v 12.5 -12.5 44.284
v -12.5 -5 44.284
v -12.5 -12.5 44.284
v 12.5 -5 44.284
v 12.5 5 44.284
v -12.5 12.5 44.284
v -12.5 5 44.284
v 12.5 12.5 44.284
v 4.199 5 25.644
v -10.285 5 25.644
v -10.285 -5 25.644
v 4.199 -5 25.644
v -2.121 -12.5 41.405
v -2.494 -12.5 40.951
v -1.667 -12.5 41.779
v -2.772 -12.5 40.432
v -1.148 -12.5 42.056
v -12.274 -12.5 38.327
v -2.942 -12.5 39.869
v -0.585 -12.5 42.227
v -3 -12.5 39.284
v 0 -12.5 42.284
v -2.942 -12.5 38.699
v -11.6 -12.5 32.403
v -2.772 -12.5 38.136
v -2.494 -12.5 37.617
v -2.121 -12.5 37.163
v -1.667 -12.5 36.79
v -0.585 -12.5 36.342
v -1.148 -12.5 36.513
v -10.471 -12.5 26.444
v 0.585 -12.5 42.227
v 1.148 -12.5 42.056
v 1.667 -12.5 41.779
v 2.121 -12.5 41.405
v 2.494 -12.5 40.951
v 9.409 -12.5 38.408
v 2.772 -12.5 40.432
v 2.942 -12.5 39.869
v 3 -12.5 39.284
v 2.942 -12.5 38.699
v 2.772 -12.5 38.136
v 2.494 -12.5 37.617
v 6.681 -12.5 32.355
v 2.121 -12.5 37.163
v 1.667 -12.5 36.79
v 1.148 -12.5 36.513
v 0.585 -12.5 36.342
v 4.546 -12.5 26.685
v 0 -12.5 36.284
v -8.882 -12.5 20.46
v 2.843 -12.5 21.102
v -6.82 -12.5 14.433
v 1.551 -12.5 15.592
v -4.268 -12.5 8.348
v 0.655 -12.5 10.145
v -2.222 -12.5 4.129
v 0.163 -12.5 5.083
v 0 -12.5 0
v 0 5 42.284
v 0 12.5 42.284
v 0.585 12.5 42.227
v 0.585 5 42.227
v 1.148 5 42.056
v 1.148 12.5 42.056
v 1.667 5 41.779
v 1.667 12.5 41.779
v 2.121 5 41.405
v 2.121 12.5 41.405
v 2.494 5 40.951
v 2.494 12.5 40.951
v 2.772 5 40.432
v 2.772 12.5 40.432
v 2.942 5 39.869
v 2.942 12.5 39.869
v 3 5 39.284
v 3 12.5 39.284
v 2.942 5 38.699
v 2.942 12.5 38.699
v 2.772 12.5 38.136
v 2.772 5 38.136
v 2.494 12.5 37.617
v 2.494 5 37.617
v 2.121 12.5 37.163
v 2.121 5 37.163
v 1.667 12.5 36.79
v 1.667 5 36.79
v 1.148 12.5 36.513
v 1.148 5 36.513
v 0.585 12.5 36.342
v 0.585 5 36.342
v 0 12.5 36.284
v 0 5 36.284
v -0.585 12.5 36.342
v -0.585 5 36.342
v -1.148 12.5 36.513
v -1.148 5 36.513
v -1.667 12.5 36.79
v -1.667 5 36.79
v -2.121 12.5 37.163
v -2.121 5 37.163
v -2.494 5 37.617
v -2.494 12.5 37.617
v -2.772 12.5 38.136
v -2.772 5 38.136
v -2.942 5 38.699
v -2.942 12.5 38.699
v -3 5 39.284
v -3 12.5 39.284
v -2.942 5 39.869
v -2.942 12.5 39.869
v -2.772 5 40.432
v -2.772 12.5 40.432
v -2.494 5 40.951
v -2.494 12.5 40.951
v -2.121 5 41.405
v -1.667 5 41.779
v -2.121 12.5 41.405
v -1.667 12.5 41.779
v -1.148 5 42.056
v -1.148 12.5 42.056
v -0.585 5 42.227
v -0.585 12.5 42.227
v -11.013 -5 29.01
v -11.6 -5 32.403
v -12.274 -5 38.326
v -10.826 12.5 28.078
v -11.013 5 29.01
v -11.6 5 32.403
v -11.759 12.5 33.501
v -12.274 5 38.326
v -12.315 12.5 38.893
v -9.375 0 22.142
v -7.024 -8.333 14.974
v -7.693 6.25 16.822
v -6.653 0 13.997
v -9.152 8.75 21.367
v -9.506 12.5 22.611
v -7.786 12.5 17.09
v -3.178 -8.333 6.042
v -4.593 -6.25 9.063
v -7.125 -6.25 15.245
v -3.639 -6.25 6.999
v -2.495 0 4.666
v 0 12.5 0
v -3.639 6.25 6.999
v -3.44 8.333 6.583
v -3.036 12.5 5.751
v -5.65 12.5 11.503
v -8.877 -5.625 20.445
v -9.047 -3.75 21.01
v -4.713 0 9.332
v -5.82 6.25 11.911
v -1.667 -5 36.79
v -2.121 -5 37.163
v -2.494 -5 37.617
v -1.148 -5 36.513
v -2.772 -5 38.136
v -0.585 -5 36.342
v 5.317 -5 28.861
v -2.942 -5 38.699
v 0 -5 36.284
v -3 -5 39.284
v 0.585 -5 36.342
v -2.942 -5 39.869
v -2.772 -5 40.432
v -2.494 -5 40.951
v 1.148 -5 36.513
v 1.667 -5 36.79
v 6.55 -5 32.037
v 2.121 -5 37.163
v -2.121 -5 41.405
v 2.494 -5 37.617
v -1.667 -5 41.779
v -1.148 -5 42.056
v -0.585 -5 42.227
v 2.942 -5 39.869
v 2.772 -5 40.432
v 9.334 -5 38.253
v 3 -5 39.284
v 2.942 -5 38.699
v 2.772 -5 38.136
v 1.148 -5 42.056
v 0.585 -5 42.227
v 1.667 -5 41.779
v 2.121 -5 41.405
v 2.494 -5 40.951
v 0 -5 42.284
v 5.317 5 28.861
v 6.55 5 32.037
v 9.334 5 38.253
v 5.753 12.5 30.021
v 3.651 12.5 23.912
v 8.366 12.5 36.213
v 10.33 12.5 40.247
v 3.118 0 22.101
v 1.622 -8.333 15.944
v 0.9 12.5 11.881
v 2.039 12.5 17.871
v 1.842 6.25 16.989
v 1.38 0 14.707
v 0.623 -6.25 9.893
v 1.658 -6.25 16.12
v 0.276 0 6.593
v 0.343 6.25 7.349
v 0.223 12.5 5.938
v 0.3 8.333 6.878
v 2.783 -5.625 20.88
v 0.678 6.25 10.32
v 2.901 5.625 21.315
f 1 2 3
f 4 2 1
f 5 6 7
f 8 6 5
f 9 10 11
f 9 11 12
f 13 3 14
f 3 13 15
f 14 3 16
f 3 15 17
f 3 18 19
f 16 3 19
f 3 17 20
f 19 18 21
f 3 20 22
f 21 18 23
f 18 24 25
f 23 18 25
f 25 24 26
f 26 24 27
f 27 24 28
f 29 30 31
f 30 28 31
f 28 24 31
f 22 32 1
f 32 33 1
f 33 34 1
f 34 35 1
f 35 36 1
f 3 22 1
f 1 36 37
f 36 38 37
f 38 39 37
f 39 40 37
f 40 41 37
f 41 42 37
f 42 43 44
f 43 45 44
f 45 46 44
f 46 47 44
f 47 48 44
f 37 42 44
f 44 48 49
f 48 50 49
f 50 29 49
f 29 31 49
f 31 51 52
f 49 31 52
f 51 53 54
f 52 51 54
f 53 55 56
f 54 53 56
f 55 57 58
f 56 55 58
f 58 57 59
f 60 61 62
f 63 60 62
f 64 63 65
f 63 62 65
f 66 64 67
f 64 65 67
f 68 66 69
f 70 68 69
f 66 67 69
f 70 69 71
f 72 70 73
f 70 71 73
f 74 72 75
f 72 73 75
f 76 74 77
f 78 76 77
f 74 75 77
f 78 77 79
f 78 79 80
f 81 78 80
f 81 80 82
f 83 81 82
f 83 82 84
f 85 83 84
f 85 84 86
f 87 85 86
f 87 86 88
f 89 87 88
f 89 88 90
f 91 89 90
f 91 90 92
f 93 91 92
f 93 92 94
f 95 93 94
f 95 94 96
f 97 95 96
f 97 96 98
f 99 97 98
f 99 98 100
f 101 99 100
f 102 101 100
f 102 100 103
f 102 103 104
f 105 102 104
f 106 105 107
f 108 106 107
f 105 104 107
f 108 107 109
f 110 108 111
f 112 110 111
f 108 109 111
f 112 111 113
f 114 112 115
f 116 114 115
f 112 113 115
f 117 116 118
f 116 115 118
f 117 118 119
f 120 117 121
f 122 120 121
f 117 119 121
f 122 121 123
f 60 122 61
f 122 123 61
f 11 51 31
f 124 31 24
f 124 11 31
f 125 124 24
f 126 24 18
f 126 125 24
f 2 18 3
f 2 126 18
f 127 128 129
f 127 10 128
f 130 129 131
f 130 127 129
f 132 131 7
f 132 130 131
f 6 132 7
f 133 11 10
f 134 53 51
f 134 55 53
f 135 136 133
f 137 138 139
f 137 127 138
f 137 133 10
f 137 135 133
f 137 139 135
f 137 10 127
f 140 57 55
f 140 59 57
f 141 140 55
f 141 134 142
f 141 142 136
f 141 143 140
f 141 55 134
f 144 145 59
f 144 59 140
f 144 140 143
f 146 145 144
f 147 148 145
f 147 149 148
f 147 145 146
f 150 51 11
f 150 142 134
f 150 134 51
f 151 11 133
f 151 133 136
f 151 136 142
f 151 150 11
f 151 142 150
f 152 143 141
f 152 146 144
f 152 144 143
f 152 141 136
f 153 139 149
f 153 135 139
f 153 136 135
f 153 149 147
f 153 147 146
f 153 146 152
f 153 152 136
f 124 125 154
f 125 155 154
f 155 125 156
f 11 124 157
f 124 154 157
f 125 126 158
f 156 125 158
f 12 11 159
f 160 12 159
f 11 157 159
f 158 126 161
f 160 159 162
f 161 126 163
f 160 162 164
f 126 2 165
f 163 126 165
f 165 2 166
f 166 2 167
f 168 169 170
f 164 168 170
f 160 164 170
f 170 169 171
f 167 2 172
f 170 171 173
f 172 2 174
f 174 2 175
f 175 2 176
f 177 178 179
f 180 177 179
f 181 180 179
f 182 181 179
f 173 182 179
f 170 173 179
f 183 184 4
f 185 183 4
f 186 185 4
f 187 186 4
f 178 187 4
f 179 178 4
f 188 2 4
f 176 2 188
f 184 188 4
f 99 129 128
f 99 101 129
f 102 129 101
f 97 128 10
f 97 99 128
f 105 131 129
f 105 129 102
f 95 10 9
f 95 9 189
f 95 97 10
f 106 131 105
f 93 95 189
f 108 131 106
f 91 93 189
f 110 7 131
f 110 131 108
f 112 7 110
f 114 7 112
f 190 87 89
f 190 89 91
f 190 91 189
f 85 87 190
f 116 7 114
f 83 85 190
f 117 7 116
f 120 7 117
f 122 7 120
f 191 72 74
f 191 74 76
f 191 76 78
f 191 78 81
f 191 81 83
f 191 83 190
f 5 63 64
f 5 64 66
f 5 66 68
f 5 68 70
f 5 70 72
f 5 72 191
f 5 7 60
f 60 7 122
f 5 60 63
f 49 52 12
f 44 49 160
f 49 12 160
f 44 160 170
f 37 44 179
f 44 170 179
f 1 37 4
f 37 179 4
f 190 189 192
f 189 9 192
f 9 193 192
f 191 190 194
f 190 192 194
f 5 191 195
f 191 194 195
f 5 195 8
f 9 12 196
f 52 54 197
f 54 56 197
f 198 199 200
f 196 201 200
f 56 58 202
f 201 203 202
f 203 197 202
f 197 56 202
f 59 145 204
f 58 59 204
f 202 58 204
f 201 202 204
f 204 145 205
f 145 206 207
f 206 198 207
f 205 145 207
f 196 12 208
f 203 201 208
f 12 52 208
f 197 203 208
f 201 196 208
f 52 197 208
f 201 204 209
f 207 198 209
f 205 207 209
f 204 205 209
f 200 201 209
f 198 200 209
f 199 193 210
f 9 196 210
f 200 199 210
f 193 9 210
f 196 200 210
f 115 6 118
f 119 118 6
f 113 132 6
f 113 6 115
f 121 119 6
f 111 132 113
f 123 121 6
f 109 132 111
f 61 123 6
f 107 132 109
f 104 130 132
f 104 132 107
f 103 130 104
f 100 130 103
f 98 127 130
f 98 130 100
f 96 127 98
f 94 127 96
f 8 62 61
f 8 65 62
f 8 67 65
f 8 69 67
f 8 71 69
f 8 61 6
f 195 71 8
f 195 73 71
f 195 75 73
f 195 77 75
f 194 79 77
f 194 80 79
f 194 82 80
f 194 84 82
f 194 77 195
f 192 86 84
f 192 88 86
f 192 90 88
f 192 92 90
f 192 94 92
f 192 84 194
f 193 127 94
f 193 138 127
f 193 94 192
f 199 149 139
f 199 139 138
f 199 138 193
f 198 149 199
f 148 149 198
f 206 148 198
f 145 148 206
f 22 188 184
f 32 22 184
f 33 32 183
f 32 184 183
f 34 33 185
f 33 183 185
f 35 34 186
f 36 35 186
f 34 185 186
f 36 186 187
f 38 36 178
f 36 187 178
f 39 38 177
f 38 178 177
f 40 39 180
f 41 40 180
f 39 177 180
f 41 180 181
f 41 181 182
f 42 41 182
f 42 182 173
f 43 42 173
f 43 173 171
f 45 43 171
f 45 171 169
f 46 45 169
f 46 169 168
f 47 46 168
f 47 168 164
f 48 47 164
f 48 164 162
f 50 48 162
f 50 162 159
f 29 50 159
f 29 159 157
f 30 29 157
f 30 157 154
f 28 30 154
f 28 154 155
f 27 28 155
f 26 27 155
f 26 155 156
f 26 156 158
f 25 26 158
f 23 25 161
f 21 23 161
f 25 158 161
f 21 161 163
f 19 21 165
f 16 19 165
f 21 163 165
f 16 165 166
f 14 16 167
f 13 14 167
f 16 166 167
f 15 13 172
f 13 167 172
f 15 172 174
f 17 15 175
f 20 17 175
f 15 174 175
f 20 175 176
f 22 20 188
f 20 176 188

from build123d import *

# Parameters (mm, degrees)
SKETCH_1_W          = 25
SKETCH_1_H          = 25
EXTRUDE_1_DEPTH     = 44.284173786
SKETCH_2_R          = 3
CUT_EXTRUDE_1_DEPTH = 36.344532851
SKETCH_4_W          = 25
SKETCH_4_H          = 10
CUT_EXTRUDE_2_DEPTH = 18.639834826
CUT_EXTRUDE_4_DEPTH = 30


with BuildPart() as part:
    # 스케치1 → 보스-돌출1 (new body)
    with BuildSketch(Plane.XY):
        Rectangle(SKETCH_1_W, SKETCH_1_H)
    extrude(amount=EXTRUDE_1_DEPTH)

    # 스케치2 → 컷-돌출1 (cut)
    with BuildSketch(Plane(origin=(0, 12.5, 0), x_dir=(1, 0, 0), z_dir=(0, 1, 0))):
        with Locations(Location((0, -39.284173786, 0), (0, 0, 270))):
            Circle(SKETCH_2_R)
    extrude(amount=-CUT_EXTRUDE_1_DEPTH, mode=Mode.SUBTRACT)

    # 스케치4 → 컷-돌출2 (cut)
    with BuildSketch(Plane.XY.offset(44.284173786)):
        Rectangle(SKETCH_4_W, SKETCH_4_H)
    extrude(amount=-CUT_EXTRUDE_2_DEPTH, mode=Mode.SUBTRACT)

    # 스케치5 → 컷-돌출4 (cut)
    with BuildSketch(Plane(origin=(0, 12.5, 0), x_dir=(1, 0, 0), z_dir=(0, 1, 0))):
        with BuildLine():
            add(Edge.make_bspline(
                [(0, 0), (-0.013056864, -22.058961494), (12.5, -44.284173786)],
                knots=[0, 0, 0, 1, 1, 1], degree=2))
            Line((12.5, -44.284173786), (12.5, 0))
            Line((12.5, 0), (0, 0))
        make_face()
        with BuildLine():
            add(Edge.make_bspline(
                [(0, 0), (-12.5, -22.142086893), (-12.5, -44.284173786)],
                knots=[0, 0, 0, 1, 1, 1], degree=2))
            Line((0, 0), (-12.5, 0))
            Line((-12.5, 0), (-12.5, -44.284173786))
        make_face()
    extrude(amount=-CUT_EXTRUDE_4_DEPTH, mode=Mode.SUBTRACT)


solid = part.part
